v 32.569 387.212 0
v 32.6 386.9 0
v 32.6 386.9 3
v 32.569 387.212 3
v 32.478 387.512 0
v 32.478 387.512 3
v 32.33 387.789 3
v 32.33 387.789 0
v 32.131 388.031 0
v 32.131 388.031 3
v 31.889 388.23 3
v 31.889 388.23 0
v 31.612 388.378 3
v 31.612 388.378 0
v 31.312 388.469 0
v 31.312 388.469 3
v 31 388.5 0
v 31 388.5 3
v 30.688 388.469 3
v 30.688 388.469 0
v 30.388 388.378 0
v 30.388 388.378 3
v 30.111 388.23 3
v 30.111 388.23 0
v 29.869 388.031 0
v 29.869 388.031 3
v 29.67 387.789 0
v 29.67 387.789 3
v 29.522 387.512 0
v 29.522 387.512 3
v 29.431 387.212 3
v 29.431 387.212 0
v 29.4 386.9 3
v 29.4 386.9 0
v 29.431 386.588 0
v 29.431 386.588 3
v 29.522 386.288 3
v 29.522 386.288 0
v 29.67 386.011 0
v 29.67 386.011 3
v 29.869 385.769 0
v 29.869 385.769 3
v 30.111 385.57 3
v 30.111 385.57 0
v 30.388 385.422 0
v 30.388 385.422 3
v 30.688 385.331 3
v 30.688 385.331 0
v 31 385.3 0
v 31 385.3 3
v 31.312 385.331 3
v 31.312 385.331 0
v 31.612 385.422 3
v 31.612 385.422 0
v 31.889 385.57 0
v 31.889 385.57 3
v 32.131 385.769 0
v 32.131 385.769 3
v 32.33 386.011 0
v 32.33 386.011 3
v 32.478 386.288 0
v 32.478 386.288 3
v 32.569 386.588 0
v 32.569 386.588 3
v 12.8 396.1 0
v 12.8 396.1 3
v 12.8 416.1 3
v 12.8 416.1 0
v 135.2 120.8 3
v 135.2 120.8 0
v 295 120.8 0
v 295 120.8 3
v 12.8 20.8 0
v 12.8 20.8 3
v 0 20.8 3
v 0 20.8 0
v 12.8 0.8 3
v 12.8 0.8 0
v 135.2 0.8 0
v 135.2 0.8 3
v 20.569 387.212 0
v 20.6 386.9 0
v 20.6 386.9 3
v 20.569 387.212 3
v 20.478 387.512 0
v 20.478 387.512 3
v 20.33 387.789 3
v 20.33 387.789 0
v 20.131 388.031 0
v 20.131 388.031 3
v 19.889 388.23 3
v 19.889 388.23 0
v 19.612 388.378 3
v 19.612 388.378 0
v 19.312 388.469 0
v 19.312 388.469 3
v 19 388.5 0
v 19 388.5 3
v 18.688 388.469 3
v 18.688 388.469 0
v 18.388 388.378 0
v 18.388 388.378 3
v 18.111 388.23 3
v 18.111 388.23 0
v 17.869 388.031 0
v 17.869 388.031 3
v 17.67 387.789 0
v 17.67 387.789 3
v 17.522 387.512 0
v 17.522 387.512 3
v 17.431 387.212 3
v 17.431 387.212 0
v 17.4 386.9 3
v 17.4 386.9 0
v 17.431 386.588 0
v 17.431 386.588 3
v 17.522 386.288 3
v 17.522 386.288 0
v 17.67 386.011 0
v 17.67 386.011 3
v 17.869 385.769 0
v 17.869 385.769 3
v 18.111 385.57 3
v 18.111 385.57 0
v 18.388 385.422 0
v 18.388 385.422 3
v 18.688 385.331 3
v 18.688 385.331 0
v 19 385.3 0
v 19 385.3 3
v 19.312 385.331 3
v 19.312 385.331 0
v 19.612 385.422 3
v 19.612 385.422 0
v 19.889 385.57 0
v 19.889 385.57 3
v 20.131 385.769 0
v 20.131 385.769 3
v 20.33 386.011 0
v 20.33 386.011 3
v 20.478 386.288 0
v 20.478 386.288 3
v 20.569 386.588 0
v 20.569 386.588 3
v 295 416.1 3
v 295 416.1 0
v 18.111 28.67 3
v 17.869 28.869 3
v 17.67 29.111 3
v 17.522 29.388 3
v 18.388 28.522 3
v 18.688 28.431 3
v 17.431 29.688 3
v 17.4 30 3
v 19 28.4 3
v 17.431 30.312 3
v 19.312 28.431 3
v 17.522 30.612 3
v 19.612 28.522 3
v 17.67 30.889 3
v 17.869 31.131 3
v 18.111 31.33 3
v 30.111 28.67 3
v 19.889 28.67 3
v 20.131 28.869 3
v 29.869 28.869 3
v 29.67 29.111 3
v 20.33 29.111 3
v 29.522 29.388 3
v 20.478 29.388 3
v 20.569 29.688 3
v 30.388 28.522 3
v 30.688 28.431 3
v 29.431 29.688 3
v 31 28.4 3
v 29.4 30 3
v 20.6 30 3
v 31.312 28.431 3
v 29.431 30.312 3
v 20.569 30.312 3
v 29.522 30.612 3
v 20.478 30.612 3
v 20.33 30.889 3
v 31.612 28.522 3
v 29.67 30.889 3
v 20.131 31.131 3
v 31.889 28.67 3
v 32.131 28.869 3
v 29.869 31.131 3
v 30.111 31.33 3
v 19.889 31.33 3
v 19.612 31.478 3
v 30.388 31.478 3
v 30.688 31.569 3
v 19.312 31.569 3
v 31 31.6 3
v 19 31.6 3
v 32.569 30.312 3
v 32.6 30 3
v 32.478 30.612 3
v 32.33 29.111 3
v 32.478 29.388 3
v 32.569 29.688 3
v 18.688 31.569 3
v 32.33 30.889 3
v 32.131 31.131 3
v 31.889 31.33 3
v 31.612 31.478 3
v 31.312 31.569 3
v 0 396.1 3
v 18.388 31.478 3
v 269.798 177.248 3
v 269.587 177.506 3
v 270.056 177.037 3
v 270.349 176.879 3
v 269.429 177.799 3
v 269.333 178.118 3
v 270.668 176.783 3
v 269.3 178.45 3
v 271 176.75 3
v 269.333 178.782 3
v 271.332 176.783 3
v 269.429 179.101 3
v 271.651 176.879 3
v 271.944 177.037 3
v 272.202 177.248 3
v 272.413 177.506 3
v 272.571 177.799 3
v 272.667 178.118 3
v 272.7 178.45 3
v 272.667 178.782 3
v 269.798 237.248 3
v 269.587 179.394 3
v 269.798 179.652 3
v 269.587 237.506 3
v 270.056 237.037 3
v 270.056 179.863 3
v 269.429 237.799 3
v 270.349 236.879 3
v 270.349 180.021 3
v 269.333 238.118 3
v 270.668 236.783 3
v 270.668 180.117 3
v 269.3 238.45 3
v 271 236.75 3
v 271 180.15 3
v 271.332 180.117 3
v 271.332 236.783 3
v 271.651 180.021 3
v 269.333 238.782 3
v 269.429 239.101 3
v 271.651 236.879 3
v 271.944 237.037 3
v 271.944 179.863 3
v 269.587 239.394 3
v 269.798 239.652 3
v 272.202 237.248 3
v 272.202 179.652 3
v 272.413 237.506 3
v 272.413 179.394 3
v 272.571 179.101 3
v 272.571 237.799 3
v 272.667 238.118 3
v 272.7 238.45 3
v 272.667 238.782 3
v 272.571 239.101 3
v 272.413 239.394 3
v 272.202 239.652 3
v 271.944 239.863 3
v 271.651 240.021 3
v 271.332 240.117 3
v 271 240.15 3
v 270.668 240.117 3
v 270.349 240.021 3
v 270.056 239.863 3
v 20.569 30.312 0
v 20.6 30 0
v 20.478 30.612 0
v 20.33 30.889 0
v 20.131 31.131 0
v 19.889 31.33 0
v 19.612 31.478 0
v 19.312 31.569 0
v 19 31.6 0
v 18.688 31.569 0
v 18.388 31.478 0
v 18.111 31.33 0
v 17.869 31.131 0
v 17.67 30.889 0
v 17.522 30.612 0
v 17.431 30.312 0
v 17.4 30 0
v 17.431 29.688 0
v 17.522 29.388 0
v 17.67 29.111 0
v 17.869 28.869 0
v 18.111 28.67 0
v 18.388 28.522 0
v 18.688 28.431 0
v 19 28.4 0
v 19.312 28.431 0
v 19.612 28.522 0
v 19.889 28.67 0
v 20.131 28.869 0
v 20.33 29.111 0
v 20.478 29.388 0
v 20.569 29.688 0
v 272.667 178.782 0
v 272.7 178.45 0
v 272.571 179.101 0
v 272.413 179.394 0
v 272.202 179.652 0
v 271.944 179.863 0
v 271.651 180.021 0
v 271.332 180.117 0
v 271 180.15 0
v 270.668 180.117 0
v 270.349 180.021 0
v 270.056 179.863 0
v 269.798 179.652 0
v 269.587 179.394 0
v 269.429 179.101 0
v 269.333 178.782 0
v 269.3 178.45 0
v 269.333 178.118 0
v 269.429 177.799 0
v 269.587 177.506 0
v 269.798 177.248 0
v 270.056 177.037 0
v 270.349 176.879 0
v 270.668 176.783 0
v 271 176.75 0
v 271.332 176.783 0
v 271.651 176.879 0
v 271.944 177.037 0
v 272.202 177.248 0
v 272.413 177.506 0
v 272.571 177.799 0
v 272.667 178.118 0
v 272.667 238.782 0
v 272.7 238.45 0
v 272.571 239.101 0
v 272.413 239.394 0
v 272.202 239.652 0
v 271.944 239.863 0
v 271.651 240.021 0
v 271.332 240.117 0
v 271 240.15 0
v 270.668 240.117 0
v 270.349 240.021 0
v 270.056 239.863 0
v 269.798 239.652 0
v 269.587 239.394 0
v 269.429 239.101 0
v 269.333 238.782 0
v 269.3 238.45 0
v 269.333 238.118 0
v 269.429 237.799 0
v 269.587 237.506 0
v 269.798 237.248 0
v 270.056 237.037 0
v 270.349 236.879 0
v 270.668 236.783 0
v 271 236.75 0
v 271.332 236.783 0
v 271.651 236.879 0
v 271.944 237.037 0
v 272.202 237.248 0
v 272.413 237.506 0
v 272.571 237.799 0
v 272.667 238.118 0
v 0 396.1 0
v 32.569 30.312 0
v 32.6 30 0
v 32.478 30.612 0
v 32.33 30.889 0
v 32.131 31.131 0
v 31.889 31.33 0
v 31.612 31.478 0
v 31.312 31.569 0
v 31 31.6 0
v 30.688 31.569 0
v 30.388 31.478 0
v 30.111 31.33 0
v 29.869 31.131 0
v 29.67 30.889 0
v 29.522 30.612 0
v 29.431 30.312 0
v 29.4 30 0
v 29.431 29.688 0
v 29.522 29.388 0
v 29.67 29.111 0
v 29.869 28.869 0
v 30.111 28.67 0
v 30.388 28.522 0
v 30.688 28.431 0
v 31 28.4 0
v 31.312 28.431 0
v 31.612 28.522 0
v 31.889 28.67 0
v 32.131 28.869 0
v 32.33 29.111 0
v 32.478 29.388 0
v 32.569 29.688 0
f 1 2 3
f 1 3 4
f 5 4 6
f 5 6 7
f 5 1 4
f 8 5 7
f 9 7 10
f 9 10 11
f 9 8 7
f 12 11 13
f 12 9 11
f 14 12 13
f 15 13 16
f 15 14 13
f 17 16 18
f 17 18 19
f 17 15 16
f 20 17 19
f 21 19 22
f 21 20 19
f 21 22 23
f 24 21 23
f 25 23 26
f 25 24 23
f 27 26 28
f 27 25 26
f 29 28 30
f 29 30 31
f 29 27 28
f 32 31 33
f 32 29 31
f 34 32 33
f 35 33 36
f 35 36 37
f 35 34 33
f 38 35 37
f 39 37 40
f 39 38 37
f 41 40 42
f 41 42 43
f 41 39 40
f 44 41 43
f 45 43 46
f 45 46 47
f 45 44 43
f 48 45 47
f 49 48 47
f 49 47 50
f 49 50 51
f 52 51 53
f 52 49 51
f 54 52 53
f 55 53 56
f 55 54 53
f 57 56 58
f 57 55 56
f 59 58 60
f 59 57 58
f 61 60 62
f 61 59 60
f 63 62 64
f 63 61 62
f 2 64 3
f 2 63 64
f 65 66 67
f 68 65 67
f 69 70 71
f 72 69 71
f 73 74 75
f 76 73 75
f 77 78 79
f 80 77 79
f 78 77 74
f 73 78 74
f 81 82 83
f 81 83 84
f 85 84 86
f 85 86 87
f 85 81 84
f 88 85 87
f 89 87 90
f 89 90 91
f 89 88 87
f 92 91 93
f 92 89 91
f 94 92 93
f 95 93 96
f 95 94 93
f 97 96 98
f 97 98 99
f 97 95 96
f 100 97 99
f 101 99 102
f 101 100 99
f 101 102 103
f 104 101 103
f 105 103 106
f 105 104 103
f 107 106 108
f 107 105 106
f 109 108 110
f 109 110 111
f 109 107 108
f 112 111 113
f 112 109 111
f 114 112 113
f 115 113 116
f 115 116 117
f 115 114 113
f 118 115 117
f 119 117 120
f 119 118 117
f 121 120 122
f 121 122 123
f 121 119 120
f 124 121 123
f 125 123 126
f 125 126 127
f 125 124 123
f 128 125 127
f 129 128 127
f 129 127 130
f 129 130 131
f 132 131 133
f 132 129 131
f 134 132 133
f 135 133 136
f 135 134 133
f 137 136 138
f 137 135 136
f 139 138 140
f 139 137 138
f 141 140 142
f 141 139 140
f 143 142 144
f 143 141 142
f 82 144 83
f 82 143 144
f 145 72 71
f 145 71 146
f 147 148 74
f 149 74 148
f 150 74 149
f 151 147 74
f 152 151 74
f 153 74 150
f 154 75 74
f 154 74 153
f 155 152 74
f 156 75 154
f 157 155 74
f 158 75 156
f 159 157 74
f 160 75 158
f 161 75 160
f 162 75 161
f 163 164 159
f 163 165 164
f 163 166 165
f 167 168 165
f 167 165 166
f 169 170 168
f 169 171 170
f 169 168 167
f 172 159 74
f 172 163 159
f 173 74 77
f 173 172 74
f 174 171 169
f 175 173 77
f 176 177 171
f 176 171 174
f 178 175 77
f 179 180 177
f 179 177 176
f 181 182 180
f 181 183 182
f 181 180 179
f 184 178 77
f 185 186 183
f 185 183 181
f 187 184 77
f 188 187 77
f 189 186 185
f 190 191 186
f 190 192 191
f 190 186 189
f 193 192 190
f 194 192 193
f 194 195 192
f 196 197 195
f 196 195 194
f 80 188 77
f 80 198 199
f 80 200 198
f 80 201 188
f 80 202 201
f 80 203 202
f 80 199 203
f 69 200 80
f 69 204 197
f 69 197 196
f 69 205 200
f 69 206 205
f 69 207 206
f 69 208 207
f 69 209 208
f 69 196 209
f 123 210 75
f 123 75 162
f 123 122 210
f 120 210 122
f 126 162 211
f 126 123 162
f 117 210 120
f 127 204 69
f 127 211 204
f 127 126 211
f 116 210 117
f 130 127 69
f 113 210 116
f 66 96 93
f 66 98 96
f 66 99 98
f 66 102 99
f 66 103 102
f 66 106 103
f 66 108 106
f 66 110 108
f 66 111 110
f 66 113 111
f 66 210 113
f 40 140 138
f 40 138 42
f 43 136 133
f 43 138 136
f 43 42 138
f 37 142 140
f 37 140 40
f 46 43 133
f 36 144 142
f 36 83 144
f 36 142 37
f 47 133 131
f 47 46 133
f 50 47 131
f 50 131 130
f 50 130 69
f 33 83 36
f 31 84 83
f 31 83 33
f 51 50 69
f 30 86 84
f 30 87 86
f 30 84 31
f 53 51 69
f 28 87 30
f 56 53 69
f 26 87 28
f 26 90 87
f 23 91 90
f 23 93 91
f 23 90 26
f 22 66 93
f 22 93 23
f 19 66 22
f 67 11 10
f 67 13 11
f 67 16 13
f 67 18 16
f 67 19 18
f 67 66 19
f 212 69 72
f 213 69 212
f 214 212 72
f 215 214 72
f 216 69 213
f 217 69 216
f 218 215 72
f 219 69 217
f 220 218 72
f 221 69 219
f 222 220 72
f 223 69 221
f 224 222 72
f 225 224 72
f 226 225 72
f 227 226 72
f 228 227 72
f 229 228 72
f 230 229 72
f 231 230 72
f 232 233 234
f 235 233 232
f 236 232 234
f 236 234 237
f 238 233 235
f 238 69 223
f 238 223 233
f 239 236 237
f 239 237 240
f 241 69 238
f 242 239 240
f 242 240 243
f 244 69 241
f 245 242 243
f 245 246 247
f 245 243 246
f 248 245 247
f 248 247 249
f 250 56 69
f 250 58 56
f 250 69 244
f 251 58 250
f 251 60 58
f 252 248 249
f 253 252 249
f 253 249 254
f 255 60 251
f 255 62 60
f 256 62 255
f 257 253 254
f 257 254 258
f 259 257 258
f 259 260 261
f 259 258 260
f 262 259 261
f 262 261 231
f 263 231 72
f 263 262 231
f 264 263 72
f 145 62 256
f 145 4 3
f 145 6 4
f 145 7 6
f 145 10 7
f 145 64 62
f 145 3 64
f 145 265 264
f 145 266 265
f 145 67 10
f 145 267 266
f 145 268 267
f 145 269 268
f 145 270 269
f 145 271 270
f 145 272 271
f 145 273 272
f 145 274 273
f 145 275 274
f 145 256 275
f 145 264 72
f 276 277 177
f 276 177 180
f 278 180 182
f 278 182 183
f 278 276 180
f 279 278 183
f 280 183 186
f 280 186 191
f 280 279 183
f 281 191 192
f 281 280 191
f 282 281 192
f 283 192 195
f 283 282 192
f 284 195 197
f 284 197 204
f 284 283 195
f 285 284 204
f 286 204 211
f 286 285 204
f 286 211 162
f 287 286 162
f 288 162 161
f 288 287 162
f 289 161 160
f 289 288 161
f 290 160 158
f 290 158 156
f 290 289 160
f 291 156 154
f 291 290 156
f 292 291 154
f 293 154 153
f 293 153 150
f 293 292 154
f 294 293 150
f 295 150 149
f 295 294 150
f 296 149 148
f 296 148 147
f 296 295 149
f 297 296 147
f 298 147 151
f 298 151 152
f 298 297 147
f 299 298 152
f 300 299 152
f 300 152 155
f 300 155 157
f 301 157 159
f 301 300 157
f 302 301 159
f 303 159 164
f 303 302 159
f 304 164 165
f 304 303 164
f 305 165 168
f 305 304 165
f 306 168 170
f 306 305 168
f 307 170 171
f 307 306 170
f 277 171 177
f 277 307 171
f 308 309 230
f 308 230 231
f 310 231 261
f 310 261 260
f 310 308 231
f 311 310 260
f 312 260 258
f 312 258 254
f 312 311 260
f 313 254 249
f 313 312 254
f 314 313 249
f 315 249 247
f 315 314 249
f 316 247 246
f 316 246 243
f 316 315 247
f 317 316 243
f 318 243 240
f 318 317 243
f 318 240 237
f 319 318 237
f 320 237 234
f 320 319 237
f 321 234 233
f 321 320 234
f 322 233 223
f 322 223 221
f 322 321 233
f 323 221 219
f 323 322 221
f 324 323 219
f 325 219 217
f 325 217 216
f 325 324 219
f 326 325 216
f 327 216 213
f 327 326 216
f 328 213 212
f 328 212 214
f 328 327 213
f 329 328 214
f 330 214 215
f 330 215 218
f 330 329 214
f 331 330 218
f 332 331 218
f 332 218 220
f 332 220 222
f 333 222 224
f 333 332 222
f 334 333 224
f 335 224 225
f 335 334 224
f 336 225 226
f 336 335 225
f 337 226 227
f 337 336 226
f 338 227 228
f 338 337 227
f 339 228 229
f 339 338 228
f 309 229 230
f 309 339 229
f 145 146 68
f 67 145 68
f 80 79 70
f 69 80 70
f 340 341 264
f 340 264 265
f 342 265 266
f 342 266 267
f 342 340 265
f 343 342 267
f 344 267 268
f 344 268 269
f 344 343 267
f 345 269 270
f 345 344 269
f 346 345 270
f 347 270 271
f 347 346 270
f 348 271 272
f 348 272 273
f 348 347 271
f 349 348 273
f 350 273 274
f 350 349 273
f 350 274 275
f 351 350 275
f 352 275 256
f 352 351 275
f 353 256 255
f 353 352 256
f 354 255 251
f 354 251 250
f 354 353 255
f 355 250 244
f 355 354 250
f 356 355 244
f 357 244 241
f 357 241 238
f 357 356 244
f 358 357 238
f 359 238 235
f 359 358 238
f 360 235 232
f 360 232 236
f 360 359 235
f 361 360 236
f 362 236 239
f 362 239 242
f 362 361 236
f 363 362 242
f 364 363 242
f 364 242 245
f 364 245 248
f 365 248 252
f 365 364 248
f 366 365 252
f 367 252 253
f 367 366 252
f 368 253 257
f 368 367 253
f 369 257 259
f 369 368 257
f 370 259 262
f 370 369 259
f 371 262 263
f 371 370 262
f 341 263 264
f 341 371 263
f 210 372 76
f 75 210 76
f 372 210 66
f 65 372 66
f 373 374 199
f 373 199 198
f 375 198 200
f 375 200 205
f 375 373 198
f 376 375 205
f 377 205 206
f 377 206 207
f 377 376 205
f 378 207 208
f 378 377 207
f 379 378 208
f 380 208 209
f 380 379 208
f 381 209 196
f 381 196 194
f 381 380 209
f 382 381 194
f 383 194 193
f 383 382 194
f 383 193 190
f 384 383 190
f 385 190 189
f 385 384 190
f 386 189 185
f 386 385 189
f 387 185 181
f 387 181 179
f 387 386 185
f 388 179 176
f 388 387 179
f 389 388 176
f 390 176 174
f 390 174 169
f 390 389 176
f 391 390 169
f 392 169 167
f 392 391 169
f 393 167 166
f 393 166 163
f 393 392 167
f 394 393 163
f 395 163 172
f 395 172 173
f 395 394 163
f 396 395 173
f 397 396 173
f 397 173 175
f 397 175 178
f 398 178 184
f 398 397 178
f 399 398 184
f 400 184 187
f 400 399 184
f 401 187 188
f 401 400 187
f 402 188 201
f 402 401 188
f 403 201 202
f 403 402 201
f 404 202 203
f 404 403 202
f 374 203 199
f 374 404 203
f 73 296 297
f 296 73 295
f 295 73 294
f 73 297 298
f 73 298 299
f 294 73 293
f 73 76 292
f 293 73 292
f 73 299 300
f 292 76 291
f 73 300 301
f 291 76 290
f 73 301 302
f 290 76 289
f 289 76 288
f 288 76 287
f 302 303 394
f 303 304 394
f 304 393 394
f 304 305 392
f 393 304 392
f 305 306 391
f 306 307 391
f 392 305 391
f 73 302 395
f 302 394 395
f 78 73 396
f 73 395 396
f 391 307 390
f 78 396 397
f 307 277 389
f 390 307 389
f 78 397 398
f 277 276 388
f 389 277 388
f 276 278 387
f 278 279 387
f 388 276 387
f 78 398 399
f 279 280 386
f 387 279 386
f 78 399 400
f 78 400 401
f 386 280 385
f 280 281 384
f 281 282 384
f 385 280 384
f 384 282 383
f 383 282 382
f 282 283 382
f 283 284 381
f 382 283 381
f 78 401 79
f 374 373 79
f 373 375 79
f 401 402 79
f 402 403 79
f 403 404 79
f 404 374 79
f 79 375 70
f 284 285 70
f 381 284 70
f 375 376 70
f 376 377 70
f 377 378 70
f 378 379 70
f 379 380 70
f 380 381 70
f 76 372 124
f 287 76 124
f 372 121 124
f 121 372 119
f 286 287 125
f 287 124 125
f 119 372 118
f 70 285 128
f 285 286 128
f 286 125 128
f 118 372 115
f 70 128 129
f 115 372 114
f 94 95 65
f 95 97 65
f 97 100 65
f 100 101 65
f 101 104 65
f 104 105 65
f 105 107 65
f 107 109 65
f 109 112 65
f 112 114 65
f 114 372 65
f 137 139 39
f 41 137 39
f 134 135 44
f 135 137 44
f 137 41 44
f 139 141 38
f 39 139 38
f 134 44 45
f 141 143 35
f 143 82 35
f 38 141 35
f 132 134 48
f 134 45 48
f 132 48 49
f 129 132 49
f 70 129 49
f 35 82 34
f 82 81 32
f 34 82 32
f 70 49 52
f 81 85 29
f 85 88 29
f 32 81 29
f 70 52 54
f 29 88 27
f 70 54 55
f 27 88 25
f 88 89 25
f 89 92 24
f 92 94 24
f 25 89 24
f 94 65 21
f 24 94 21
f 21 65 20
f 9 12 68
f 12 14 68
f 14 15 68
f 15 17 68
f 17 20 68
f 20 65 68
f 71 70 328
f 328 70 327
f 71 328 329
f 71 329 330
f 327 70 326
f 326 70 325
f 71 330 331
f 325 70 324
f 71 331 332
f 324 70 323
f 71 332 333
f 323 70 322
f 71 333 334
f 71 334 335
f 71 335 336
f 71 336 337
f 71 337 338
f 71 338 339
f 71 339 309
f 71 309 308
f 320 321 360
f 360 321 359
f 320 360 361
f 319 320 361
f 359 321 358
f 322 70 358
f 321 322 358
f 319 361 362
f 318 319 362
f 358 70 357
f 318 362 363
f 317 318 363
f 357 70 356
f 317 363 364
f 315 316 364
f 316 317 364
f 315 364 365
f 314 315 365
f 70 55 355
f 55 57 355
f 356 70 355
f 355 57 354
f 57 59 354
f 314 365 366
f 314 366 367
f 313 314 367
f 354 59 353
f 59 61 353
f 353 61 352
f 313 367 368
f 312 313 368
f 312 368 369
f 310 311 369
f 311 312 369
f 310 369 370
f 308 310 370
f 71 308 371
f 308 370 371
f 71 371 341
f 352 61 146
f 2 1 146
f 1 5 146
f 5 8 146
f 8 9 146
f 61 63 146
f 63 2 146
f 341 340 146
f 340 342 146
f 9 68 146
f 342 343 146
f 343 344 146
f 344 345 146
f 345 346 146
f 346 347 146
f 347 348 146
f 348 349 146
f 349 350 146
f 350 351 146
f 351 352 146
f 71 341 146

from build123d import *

# Parameters (mm, degrees)
BOSS_EXTRUDE1_DEPTH          = 3
SKETCH2_W                    = 10
SKETCH2_H                    = 416.9
BOSS_EXTRUDE2_DEPTH          = 0.1
CUT_EXTRUDE1_DEPTH           = 10
M3_CLEARANCE_HOLE1_OUTLINE_R = 1.6
M3_CLEARANCE_HOLE1_DEPTH     = 3
M3_CLEARANCE_HOLE2_OUTLINE_R = 1.7
M3_CLEARANCE_HOLE2_DEPTH     = 3
SKETCH6_W                    = 5
SKETCH6_H                    = 296.9
CUT_EXTRUDE2_DEPTH           = 10
MOVE_FACE1_BY                = 0.8
MOVE_FACE1_2_BY              = 0.8
MOVE_FACE1_3_BY              = 0.8
MOVE_FACE1_4_BY              = 0.8
MOVE_FACE1_5_BY              = 0.8
MOVE_FACE1_6_BY              = 0.8
MOVE_FACE1_7_BY              = 0.8
MOVE_FACE1_8_BY              = 0.8


# Read off the part's stored shape, not the designer's step: M3 Clearance Hole1, M3 Clearance Hole2
with BuildPart() as part:
    # Sketch1 → Boss-Extrude1 (new body)
    with BuildSketch(Plane.XY):
        Polygon((0, 0), (136, 0), (136, 120), (300, 120), (300, 416.9), (0, 416.9), align=None)
    extrude(amount=BOSS_EXTRUDE1_DEPTH)


with BuildPart() as body_2:
    # Sketch2 → Boss-Extrude2 (new body)
    with BuildSketch(Plane.XY):
        with Locations((1, 208.45)):
            Rectangle(SKETCH2_W, SKETCH2_H)
    extrude(amount=-BOSS_EXTRUDE2_DEPTH)


with BuildPart() as cut_extrude1_tool:
    # Sketch3 → Cut-Extrude1 (new body)
    with BuildSketch(Plane.XY.offset(3)):
        Polygon((0, 416.9), (-4, 416.9), (-4, 396.9), (0, 396.9), (12, 396.9), (12, 416.9), align=None)
        Polygon((0, 0), (12, 0), (12, 20), (0, 20), (-4, 20), (-4, 0), align=None)
    extrude(amount=-CUT_EXTRUDE1_DEPTH)


with BuildPart() as part_1:
    add(part.part)

    # Cut-Extrude1: cut by cut_extrude1_tool
    add(cut_extrude1_tool.part, mode=Mode.SUBTRACT)

    # M3 Clearance Hole1 outline → M3 Clearance Hole1 (cut)
    with BuildSketch(Plane.XY):
        with Locations((31, 30)):
            Circle(M3_CLEARANCE_HOLE1_OUTLINE_R)
        with Locations((19, 30)):
            Circle(M3_CLEARANCE_HOLE1_OUTLINE_R)
        with Locations((31, 386.9)):
            Circle(M3_CLEARANCE_HOLE1_OUTLINE_R)
        with Locations((19, 386.9)):
            Circle(M3_CLEARANCE_HOLE1_OUTLINE_R)
    extrude(amount=M3_CLEARANCE_HOLE1_DEPTH, mode=Mode.SUBTRACT)

    # M3 Clearance Hole2 outline → M3 Clearance Hole2 (cut)
    with BuildSketch(Plane.XY):
        with Locations((271, 178.45)):
            Circle(M3_CLEARANCE_HOLE2_OUTLINE_R)
        with Locations((271, 238.45)):
            Circle(M3_CLEARANCE_HOLE2_OUTLINE_R)
    extrude(amount=M3_CLEARANCE_HOLE2_DEPTH, mode=Mode.SUBTRACT)

    # Sketch6 → Cut-Extrude2 (cut)
    with BuildSketch(Plane.XY.offset(3)):
        with Locations((297.5, 268.45)):
            Rectangle(SKETCH6_W, SKETCH6_H)
    extrude(amount=-CUT_EXTRUDE2_DEPTH, mode=Mode.SUBTRACT)

    # Move Face1: a face moved inward by 0.8
    extrude(part_1.faces().sort_by_distance((215.5, 120, 1.5))[0], amount=MOVE_FACE1_BY, dir=(0, 1, 0), mode=Mode.SUBTRACT)

    # Move Face1 2: a face moved inward by 0.8
    extrude(part_1.faces().sort_by_distance((136, 60, 1.5))[0], amount=MOVE_FACE1_2_BY, dir=(-1, 0, 0), mode=Mode.SUBTRACT)

    # Move Face1 3: a face moved inward by 0.8
    extrude(part_1.faces().sort_by_distance((74, 0, 1.5))[0], amount=MOVE_FACE1_3_BY, dir=(0, 1, 0), mode=Mode.SUBTRACT)

    # Move Face1 4: a face moved inward by 0.8
    extrude(part_1.faces().sort_by_distance((12, 10, 1.5))[0], amount=MOVE_FACE1_4_BY, dir=(1, 0, 0), mode=Mode.SUBTRACT)

    # Move Face1 5: a face moved inward by 0.8
    extrude(part_1.faces().sort_by_distance((6, 20, 1.5))[0], amount=MOVE_FACE1_5_BY, dir=(0, 1, 0), mode=Mode.SUBTRACT)

    # Move Face1 6: a face moved inward by 0.8
    extrude(part_1.faces().sort_by_distance((153.5, 416.9, 1.5))[0], amount=MOVE_FACE1_6_BY, dir=(0, -1, 0), mode=Mode.SUBTRACT)

    # Move Face1 7: a face moved inward by 0.8
    extrude(part_1.faces().sort_by_distance((12, 406.9, 1.5))[0], amount=MOVE_FACE1_7_BY, dir=(1, 0, 0), mode=Mode.SUBTRACT)

    # Move Face1 8: a face moved inward by 0.8
    extrude(part_1.faces().sort_by_distance((6, 396.9, 1.5))[0], amount=MOVE_FACE1_8_BY, dir=(0, -1, 0), mode=Mode.SUBTRACT)


with BuildPart() as body_2_1:
    add(body_2.part)

    # Cut-Extrude1: cut by cut_extrude1_tool
    add(cut_extrude1_tool.part, mode=Mode.SUBTRACT)


solid = part_1.part
